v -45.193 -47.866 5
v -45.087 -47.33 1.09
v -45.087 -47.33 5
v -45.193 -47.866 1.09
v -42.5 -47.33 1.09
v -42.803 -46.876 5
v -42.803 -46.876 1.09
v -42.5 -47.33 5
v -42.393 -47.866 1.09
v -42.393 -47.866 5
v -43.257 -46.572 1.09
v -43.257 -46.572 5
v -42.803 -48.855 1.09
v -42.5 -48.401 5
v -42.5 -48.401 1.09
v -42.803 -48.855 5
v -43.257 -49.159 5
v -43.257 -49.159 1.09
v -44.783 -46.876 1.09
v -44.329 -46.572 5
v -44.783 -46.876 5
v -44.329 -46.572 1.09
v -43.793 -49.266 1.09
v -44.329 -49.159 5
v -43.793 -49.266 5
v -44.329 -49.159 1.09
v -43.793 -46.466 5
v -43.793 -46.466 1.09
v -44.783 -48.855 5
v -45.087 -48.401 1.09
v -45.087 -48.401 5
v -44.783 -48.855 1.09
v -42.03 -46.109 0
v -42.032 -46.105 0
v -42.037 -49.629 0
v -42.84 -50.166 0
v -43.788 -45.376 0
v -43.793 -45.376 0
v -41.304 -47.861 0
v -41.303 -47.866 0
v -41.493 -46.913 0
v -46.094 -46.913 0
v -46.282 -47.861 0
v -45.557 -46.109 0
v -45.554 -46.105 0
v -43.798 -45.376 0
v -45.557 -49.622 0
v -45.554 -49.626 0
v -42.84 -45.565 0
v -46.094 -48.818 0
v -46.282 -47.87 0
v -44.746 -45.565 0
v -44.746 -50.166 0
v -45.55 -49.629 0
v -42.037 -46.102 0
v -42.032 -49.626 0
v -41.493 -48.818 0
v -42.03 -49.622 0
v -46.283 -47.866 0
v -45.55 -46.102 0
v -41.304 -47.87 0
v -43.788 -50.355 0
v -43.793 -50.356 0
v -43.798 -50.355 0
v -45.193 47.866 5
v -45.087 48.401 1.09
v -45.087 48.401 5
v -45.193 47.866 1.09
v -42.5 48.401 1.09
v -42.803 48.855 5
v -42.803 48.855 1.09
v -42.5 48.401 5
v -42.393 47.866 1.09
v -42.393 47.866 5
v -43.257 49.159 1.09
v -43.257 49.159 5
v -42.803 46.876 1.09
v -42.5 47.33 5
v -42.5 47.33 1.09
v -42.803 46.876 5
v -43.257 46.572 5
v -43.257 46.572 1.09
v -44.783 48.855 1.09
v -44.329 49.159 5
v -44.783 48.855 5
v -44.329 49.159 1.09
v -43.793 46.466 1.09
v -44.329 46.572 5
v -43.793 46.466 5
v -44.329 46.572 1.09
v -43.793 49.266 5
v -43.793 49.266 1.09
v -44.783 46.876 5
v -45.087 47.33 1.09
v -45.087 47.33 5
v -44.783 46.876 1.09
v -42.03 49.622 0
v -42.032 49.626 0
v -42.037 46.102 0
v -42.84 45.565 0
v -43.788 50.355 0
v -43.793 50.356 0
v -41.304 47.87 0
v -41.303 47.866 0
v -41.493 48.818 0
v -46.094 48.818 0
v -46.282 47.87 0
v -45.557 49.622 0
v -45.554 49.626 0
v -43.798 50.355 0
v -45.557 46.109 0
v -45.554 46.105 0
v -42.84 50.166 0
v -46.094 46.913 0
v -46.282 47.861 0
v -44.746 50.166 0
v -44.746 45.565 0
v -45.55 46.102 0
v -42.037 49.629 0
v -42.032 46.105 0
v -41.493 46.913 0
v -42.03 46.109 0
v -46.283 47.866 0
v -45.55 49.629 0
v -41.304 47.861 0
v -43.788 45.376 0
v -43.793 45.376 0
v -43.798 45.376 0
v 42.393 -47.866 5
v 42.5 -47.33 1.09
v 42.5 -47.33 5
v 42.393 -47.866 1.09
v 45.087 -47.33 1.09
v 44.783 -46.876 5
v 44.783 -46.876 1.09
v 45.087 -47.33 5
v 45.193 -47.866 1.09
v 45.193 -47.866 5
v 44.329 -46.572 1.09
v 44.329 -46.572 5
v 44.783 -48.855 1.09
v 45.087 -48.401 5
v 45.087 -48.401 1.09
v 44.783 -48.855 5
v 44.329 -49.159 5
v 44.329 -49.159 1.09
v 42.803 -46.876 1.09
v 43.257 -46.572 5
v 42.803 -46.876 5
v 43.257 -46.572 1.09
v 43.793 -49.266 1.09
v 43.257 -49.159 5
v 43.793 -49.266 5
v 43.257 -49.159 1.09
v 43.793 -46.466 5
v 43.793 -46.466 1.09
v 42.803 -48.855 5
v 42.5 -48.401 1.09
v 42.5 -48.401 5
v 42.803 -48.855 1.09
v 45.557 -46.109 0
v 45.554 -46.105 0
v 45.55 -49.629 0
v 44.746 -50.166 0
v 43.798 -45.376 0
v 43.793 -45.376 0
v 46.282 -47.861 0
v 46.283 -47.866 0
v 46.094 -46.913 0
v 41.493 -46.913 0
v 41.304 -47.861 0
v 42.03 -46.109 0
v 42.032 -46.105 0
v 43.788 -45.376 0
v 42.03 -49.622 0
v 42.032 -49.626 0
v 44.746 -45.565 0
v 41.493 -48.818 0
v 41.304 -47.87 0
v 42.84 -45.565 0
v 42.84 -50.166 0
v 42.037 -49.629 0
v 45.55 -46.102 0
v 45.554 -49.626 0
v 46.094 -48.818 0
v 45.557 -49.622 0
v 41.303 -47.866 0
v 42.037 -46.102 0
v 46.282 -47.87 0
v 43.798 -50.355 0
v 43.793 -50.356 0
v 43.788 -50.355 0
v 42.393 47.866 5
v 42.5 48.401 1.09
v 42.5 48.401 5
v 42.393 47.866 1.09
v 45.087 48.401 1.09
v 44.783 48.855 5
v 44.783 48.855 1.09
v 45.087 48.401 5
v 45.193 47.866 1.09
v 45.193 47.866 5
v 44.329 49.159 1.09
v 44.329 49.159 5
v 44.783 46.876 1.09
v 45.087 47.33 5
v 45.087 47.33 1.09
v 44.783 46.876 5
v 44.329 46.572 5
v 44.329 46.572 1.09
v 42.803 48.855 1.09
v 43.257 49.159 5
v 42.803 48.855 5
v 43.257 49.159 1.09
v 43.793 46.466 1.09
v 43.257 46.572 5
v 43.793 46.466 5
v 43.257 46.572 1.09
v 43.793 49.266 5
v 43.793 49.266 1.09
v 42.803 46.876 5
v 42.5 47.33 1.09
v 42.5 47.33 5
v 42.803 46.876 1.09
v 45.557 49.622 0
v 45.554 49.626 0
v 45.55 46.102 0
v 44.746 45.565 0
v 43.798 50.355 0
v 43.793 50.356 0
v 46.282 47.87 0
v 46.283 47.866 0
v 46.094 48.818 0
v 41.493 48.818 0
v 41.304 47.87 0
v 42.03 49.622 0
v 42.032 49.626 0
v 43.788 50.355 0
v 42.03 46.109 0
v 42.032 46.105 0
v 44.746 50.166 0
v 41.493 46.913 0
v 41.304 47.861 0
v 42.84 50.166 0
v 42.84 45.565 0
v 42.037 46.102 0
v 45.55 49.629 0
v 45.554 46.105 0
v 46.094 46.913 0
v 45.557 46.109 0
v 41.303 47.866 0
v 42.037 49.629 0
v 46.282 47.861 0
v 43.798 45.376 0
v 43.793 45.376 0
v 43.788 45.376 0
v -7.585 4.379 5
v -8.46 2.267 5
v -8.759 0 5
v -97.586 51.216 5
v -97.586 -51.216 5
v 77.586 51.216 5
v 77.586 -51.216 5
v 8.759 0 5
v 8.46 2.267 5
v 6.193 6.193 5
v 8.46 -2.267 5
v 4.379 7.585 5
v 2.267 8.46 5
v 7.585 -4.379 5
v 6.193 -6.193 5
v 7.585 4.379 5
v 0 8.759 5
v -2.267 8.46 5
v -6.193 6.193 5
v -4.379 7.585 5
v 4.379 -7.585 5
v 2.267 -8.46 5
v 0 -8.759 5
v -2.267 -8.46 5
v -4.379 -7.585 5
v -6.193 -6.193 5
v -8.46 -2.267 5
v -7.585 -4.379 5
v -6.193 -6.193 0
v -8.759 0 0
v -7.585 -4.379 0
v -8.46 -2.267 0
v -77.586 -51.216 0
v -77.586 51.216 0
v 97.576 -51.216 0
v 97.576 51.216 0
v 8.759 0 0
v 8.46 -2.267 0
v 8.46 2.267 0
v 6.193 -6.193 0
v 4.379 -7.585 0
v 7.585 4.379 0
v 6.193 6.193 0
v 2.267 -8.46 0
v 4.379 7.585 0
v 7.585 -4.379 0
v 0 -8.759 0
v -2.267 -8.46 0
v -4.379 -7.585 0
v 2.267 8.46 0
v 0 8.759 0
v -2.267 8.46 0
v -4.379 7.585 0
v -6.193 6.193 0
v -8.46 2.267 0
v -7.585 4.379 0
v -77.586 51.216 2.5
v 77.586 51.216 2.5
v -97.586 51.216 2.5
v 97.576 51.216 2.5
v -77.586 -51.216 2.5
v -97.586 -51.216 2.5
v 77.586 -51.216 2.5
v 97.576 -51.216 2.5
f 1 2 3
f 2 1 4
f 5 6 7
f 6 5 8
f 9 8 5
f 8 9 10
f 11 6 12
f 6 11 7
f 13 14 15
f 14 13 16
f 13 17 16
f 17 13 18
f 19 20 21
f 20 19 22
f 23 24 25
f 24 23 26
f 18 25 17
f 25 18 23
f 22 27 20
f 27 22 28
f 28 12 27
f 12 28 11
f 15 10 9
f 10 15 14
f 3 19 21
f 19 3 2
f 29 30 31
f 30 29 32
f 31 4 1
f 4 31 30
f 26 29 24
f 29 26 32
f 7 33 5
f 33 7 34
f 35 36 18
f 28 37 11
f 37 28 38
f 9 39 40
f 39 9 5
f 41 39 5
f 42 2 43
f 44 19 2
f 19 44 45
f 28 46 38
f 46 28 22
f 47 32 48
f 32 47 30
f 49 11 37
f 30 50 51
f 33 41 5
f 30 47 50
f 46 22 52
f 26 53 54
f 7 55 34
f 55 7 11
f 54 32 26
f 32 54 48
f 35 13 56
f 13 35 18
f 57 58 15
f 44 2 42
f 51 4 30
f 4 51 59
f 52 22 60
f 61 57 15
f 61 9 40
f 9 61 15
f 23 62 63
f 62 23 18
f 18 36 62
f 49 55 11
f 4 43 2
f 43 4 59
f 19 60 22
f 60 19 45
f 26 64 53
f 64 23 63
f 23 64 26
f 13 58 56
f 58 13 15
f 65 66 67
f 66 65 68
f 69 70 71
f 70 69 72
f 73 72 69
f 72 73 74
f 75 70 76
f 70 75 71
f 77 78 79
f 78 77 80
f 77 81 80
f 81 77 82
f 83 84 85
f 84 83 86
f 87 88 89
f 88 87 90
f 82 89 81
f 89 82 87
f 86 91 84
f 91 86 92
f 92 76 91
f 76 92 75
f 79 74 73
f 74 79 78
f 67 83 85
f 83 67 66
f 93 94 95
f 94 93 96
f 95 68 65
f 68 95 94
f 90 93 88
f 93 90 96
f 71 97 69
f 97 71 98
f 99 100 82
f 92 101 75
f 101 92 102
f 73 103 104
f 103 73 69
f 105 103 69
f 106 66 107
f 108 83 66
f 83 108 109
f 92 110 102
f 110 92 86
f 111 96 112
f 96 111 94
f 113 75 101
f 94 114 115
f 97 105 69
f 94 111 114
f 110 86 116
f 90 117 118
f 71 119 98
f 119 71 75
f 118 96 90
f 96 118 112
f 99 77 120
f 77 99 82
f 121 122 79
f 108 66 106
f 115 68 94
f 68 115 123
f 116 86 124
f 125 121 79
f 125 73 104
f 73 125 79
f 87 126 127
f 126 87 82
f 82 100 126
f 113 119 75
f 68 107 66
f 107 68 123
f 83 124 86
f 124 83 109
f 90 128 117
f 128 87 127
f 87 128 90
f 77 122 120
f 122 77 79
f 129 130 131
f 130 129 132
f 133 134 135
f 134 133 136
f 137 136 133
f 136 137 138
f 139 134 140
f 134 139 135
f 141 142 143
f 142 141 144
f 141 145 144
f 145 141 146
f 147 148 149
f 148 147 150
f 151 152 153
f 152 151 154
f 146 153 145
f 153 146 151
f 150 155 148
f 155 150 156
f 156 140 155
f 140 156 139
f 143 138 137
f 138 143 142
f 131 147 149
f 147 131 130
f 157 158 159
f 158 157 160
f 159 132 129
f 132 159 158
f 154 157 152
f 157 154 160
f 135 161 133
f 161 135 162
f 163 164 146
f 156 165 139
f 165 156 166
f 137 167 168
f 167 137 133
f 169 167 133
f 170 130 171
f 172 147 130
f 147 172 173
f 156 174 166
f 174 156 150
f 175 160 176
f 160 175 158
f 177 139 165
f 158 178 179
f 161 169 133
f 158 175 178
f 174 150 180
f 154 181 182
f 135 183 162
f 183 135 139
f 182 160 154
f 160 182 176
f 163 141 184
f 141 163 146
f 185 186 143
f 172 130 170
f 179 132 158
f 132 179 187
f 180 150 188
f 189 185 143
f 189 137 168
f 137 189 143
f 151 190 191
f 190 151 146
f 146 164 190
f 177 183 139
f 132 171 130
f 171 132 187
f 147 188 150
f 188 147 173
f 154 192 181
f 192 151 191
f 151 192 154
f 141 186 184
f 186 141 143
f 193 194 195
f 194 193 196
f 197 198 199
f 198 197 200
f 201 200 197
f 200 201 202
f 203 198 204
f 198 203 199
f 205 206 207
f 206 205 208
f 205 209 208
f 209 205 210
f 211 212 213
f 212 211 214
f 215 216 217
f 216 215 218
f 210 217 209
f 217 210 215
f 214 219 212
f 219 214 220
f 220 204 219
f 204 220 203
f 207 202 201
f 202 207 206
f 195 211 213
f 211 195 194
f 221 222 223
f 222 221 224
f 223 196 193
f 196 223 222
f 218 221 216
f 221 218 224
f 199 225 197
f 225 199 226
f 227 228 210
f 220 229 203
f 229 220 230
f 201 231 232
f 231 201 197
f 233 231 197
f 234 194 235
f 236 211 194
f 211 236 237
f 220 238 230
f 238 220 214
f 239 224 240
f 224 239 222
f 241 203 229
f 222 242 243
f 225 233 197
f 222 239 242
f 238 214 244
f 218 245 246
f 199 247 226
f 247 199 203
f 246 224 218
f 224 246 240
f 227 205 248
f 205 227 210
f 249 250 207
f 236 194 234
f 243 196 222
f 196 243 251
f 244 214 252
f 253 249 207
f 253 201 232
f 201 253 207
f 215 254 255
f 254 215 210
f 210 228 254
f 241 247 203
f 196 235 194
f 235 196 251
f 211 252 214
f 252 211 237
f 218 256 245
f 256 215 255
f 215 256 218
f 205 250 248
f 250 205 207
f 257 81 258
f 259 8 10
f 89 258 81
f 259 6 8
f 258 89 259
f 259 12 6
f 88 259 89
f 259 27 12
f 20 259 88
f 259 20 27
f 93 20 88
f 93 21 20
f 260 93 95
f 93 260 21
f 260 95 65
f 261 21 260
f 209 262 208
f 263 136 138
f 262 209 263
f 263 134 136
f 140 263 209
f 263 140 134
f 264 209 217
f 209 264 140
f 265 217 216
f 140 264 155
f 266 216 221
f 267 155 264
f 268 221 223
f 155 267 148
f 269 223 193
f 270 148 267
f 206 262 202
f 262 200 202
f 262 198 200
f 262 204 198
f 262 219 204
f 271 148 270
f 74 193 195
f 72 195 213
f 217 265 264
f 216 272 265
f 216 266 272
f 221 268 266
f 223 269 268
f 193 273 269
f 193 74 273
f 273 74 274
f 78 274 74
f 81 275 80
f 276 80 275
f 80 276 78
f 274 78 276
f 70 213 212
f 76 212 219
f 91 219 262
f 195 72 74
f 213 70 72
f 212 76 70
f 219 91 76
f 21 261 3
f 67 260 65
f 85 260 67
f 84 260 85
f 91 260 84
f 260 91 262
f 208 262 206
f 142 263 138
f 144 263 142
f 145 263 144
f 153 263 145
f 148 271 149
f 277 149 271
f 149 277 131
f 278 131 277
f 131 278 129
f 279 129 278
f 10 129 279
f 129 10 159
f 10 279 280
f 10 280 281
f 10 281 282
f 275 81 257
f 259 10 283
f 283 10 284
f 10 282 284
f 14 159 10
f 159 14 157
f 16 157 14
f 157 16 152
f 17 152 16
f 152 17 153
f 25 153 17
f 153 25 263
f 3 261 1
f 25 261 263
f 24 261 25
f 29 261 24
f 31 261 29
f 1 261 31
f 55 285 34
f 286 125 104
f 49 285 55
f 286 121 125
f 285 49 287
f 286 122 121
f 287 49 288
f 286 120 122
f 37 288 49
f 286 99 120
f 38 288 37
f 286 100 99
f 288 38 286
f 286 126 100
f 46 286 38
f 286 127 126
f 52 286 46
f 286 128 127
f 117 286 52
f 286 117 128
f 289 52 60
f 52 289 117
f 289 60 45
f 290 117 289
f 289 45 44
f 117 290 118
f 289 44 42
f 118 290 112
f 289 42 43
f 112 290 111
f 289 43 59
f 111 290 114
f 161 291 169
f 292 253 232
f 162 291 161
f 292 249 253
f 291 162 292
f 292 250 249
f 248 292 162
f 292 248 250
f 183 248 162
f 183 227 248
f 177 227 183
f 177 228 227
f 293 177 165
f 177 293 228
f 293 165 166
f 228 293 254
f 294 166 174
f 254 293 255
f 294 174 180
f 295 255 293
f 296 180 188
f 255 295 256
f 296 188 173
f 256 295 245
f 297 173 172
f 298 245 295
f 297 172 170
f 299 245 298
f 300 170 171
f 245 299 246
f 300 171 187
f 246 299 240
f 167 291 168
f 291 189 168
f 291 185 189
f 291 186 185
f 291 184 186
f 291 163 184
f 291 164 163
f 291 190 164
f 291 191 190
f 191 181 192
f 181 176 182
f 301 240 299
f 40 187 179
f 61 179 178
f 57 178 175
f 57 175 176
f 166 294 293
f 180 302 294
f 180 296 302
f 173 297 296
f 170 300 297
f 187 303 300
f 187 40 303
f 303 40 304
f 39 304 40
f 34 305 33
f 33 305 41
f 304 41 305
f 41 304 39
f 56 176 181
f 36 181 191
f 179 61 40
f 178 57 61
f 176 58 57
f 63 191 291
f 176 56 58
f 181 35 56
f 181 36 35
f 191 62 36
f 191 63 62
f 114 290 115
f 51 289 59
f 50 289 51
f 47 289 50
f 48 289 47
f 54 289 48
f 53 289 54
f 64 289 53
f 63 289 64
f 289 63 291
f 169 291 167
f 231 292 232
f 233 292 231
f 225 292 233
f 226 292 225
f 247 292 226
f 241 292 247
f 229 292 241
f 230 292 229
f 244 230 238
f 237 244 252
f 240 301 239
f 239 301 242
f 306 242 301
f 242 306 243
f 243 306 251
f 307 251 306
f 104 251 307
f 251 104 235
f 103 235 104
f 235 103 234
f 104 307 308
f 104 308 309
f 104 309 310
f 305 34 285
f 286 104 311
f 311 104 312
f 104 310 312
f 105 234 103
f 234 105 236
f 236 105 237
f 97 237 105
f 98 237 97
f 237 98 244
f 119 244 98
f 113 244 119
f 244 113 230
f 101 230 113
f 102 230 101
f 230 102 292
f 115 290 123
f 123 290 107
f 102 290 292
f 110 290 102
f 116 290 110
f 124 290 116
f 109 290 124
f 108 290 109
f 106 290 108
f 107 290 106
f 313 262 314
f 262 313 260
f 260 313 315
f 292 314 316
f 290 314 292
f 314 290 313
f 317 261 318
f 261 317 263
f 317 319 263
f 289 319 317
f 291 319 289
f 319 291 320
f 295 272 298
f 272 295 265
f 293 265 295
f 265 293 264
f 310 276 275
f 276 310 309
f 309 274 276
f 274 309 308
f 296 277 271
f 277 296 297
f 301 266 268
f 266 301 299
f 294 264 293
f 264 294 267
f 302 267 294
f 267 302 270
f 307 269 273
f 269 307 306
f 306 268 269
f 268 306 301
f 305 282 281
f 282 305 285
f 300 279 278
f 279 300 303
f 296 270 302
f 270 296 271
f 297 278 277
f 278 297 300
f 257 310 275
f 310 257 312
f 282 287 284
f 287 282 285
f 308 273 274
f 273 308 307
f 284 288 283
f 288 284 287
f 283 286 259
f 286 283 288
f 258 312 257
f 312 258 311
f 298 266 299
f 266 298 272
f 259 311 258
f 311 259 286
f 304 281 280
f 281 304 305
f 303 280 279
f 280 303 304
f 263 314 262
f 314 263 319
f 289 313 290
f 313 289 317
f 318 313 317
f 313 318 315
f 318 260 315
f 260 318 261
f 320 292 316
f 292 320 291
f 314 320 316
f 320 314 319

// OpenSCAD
// file: ../../library/e7_all.scad
// ==========================================================================
//  e7_all.scad - include this one file. Preview, print plates and the report.
// ==========================================================================
include <e7_params.scad>
include <e7_body.scad>

// whole painted loco
module e7_preview() {
  // carbody in its paint bands
  for (i = [0:len(PAINT_BANDS) - 1]) {
    z0 = i == 0 ? -1 : p(PAINT_BANDS[i - 1][0]);
    z1 = i == len(PAINT_BANDS) - 1 ? 1000 : p(PAINT_BANDS[i][0]);
    color(PAINT_BANDS[i][1]) render(convexity = 8) e7_shell_solid([z0, z1]);
  }
  color(C_GLASS) e7_glass();
  color(C_LENS) let (d = nose_d_at_z(HEADLIGHT[0]))
    translate([XF - p(d) + p(HEADLIGHT[2]) + p(1.5), 0, p(HEADLIGHT[0])]) rotate([0, 90, 0]) cylinder(d = p(HEADLIGHT[1]) - 0.8, h = 0.5, $fn = 32);
  color(C_FRAME) { for (j = [1:NFRAME]) e7_frame_piece(j); e7_pilot(); e7_pilot_rear(); }
  for (tx = [TRK_X, -TRK_X]) translate([tx, 0, 0]) { color(C_TRUCK) e7_truck_frame(); color(C_WHEEL) e7_wheels(); }
}
// thin glass panes sitting in the window pockets (preview only)
module e7_glass() {
  intersection() { e7_loft(DET * 0.6); union() { e7_windshield_cut(); e7_side_cuts_windows_only(); } }
}
module e7_side_cuts_windows_only() {
  for (s = [-1, 1], w = CAB_WIN)
    translate([XF - p(w[1]), s * HW - (s > 0 ? DET : 3 - DET), p(w[2])]) cube([p(w[1] - w[0]), 3, p(w[3] - w[2])]);
}

// one print, laid out for the printer
module e7_plate(part) {
  sec = [for (k = [1:NSEC]) str("body_", k)];
  frm = [for (j = [1:NFRAME]) str("frame_", j)];
  if (is_num(search([part], sec)[0])) {
    k = search([part], sec)[0] + 1;
    // stand the section on its open bottom (skirt edge on the bed)
    translate([-sec_x0(k) - SEC_L / 2, 0, -Z_SKIRT]) e7_body_section(k);
  } else if (is_num(search([part], frm)[0])) {
    j = search([part], frm)[0] + 1;
    xs = concat([FRAME_X0], FRAME_SPLITS, [FRAME_X1]);
    translate([-(xs[j - 1] + xs[j]) / 2, 0, -Z_FRAME_BOT]) e7_frame_piece(j);
  } else if (part == "pilot") {
    translate([-XF, 0, 0]) rotate([0, 0, 0]) translate([0, 0, -p(5)]) e7_pilot();
  } else if (part == "pilot_rear") {
    translate([-XR, 0, 0]) translate([0, 0, -(CPL_Z - CPL_H / 2 - WALL)]) e7_pilot_rear();
  } else if (part == "truck") {
    // upside down, bolster on the bed
    translate([0, 0, Z_FRAME_BOT - 0.3]) rotate([180, 0, 0]) e7_truck_frame();
  } else {
    assert(false, str("unknown part '", part, "'"));
  }
}

module e7_report() {
  echo(str("MILW E7A ", ROAD_NO, " class ", CLASS, " - ", SC, " scale 1:", RATIO, ", paint ", PAINT));
  echo(str("  carbody ", round(BL), " mm long, ", round(2 * HW), " mm wide, roof ", round(Z_ROOF), " mm, cab ", round(Z_CAB), " mm above rail"));
  echo(str("  ", NSEC, " body sections of ", round(SEC_L), " mm; ", NFRAME, " frame pieces; trucks at +/- ", round(TRK_X), " mm"));
  echo(str("  body screws ", SCREW_BODY_NAME, " x ", 2 * len(BOSS_X), "; truck pivots ", PIVOT[1], "; wheels ", round(WHEEL_D * 10) / 10, " mm (bought)"));
}
// main file
// Milwaukee Road E7A, G scale 1-29 - print 7 of 12: frame_3 - frame plate piece 3 (print flat)
// Render (F6), export STL, print. Settings: ../../library/e7_params.scad
// Whole loco preview and notes: ../../MILW_E7_Main.scad
SCALE_SEL = "G";
include <../../library/e7_all.scad>
e7_plate("frame_3");
